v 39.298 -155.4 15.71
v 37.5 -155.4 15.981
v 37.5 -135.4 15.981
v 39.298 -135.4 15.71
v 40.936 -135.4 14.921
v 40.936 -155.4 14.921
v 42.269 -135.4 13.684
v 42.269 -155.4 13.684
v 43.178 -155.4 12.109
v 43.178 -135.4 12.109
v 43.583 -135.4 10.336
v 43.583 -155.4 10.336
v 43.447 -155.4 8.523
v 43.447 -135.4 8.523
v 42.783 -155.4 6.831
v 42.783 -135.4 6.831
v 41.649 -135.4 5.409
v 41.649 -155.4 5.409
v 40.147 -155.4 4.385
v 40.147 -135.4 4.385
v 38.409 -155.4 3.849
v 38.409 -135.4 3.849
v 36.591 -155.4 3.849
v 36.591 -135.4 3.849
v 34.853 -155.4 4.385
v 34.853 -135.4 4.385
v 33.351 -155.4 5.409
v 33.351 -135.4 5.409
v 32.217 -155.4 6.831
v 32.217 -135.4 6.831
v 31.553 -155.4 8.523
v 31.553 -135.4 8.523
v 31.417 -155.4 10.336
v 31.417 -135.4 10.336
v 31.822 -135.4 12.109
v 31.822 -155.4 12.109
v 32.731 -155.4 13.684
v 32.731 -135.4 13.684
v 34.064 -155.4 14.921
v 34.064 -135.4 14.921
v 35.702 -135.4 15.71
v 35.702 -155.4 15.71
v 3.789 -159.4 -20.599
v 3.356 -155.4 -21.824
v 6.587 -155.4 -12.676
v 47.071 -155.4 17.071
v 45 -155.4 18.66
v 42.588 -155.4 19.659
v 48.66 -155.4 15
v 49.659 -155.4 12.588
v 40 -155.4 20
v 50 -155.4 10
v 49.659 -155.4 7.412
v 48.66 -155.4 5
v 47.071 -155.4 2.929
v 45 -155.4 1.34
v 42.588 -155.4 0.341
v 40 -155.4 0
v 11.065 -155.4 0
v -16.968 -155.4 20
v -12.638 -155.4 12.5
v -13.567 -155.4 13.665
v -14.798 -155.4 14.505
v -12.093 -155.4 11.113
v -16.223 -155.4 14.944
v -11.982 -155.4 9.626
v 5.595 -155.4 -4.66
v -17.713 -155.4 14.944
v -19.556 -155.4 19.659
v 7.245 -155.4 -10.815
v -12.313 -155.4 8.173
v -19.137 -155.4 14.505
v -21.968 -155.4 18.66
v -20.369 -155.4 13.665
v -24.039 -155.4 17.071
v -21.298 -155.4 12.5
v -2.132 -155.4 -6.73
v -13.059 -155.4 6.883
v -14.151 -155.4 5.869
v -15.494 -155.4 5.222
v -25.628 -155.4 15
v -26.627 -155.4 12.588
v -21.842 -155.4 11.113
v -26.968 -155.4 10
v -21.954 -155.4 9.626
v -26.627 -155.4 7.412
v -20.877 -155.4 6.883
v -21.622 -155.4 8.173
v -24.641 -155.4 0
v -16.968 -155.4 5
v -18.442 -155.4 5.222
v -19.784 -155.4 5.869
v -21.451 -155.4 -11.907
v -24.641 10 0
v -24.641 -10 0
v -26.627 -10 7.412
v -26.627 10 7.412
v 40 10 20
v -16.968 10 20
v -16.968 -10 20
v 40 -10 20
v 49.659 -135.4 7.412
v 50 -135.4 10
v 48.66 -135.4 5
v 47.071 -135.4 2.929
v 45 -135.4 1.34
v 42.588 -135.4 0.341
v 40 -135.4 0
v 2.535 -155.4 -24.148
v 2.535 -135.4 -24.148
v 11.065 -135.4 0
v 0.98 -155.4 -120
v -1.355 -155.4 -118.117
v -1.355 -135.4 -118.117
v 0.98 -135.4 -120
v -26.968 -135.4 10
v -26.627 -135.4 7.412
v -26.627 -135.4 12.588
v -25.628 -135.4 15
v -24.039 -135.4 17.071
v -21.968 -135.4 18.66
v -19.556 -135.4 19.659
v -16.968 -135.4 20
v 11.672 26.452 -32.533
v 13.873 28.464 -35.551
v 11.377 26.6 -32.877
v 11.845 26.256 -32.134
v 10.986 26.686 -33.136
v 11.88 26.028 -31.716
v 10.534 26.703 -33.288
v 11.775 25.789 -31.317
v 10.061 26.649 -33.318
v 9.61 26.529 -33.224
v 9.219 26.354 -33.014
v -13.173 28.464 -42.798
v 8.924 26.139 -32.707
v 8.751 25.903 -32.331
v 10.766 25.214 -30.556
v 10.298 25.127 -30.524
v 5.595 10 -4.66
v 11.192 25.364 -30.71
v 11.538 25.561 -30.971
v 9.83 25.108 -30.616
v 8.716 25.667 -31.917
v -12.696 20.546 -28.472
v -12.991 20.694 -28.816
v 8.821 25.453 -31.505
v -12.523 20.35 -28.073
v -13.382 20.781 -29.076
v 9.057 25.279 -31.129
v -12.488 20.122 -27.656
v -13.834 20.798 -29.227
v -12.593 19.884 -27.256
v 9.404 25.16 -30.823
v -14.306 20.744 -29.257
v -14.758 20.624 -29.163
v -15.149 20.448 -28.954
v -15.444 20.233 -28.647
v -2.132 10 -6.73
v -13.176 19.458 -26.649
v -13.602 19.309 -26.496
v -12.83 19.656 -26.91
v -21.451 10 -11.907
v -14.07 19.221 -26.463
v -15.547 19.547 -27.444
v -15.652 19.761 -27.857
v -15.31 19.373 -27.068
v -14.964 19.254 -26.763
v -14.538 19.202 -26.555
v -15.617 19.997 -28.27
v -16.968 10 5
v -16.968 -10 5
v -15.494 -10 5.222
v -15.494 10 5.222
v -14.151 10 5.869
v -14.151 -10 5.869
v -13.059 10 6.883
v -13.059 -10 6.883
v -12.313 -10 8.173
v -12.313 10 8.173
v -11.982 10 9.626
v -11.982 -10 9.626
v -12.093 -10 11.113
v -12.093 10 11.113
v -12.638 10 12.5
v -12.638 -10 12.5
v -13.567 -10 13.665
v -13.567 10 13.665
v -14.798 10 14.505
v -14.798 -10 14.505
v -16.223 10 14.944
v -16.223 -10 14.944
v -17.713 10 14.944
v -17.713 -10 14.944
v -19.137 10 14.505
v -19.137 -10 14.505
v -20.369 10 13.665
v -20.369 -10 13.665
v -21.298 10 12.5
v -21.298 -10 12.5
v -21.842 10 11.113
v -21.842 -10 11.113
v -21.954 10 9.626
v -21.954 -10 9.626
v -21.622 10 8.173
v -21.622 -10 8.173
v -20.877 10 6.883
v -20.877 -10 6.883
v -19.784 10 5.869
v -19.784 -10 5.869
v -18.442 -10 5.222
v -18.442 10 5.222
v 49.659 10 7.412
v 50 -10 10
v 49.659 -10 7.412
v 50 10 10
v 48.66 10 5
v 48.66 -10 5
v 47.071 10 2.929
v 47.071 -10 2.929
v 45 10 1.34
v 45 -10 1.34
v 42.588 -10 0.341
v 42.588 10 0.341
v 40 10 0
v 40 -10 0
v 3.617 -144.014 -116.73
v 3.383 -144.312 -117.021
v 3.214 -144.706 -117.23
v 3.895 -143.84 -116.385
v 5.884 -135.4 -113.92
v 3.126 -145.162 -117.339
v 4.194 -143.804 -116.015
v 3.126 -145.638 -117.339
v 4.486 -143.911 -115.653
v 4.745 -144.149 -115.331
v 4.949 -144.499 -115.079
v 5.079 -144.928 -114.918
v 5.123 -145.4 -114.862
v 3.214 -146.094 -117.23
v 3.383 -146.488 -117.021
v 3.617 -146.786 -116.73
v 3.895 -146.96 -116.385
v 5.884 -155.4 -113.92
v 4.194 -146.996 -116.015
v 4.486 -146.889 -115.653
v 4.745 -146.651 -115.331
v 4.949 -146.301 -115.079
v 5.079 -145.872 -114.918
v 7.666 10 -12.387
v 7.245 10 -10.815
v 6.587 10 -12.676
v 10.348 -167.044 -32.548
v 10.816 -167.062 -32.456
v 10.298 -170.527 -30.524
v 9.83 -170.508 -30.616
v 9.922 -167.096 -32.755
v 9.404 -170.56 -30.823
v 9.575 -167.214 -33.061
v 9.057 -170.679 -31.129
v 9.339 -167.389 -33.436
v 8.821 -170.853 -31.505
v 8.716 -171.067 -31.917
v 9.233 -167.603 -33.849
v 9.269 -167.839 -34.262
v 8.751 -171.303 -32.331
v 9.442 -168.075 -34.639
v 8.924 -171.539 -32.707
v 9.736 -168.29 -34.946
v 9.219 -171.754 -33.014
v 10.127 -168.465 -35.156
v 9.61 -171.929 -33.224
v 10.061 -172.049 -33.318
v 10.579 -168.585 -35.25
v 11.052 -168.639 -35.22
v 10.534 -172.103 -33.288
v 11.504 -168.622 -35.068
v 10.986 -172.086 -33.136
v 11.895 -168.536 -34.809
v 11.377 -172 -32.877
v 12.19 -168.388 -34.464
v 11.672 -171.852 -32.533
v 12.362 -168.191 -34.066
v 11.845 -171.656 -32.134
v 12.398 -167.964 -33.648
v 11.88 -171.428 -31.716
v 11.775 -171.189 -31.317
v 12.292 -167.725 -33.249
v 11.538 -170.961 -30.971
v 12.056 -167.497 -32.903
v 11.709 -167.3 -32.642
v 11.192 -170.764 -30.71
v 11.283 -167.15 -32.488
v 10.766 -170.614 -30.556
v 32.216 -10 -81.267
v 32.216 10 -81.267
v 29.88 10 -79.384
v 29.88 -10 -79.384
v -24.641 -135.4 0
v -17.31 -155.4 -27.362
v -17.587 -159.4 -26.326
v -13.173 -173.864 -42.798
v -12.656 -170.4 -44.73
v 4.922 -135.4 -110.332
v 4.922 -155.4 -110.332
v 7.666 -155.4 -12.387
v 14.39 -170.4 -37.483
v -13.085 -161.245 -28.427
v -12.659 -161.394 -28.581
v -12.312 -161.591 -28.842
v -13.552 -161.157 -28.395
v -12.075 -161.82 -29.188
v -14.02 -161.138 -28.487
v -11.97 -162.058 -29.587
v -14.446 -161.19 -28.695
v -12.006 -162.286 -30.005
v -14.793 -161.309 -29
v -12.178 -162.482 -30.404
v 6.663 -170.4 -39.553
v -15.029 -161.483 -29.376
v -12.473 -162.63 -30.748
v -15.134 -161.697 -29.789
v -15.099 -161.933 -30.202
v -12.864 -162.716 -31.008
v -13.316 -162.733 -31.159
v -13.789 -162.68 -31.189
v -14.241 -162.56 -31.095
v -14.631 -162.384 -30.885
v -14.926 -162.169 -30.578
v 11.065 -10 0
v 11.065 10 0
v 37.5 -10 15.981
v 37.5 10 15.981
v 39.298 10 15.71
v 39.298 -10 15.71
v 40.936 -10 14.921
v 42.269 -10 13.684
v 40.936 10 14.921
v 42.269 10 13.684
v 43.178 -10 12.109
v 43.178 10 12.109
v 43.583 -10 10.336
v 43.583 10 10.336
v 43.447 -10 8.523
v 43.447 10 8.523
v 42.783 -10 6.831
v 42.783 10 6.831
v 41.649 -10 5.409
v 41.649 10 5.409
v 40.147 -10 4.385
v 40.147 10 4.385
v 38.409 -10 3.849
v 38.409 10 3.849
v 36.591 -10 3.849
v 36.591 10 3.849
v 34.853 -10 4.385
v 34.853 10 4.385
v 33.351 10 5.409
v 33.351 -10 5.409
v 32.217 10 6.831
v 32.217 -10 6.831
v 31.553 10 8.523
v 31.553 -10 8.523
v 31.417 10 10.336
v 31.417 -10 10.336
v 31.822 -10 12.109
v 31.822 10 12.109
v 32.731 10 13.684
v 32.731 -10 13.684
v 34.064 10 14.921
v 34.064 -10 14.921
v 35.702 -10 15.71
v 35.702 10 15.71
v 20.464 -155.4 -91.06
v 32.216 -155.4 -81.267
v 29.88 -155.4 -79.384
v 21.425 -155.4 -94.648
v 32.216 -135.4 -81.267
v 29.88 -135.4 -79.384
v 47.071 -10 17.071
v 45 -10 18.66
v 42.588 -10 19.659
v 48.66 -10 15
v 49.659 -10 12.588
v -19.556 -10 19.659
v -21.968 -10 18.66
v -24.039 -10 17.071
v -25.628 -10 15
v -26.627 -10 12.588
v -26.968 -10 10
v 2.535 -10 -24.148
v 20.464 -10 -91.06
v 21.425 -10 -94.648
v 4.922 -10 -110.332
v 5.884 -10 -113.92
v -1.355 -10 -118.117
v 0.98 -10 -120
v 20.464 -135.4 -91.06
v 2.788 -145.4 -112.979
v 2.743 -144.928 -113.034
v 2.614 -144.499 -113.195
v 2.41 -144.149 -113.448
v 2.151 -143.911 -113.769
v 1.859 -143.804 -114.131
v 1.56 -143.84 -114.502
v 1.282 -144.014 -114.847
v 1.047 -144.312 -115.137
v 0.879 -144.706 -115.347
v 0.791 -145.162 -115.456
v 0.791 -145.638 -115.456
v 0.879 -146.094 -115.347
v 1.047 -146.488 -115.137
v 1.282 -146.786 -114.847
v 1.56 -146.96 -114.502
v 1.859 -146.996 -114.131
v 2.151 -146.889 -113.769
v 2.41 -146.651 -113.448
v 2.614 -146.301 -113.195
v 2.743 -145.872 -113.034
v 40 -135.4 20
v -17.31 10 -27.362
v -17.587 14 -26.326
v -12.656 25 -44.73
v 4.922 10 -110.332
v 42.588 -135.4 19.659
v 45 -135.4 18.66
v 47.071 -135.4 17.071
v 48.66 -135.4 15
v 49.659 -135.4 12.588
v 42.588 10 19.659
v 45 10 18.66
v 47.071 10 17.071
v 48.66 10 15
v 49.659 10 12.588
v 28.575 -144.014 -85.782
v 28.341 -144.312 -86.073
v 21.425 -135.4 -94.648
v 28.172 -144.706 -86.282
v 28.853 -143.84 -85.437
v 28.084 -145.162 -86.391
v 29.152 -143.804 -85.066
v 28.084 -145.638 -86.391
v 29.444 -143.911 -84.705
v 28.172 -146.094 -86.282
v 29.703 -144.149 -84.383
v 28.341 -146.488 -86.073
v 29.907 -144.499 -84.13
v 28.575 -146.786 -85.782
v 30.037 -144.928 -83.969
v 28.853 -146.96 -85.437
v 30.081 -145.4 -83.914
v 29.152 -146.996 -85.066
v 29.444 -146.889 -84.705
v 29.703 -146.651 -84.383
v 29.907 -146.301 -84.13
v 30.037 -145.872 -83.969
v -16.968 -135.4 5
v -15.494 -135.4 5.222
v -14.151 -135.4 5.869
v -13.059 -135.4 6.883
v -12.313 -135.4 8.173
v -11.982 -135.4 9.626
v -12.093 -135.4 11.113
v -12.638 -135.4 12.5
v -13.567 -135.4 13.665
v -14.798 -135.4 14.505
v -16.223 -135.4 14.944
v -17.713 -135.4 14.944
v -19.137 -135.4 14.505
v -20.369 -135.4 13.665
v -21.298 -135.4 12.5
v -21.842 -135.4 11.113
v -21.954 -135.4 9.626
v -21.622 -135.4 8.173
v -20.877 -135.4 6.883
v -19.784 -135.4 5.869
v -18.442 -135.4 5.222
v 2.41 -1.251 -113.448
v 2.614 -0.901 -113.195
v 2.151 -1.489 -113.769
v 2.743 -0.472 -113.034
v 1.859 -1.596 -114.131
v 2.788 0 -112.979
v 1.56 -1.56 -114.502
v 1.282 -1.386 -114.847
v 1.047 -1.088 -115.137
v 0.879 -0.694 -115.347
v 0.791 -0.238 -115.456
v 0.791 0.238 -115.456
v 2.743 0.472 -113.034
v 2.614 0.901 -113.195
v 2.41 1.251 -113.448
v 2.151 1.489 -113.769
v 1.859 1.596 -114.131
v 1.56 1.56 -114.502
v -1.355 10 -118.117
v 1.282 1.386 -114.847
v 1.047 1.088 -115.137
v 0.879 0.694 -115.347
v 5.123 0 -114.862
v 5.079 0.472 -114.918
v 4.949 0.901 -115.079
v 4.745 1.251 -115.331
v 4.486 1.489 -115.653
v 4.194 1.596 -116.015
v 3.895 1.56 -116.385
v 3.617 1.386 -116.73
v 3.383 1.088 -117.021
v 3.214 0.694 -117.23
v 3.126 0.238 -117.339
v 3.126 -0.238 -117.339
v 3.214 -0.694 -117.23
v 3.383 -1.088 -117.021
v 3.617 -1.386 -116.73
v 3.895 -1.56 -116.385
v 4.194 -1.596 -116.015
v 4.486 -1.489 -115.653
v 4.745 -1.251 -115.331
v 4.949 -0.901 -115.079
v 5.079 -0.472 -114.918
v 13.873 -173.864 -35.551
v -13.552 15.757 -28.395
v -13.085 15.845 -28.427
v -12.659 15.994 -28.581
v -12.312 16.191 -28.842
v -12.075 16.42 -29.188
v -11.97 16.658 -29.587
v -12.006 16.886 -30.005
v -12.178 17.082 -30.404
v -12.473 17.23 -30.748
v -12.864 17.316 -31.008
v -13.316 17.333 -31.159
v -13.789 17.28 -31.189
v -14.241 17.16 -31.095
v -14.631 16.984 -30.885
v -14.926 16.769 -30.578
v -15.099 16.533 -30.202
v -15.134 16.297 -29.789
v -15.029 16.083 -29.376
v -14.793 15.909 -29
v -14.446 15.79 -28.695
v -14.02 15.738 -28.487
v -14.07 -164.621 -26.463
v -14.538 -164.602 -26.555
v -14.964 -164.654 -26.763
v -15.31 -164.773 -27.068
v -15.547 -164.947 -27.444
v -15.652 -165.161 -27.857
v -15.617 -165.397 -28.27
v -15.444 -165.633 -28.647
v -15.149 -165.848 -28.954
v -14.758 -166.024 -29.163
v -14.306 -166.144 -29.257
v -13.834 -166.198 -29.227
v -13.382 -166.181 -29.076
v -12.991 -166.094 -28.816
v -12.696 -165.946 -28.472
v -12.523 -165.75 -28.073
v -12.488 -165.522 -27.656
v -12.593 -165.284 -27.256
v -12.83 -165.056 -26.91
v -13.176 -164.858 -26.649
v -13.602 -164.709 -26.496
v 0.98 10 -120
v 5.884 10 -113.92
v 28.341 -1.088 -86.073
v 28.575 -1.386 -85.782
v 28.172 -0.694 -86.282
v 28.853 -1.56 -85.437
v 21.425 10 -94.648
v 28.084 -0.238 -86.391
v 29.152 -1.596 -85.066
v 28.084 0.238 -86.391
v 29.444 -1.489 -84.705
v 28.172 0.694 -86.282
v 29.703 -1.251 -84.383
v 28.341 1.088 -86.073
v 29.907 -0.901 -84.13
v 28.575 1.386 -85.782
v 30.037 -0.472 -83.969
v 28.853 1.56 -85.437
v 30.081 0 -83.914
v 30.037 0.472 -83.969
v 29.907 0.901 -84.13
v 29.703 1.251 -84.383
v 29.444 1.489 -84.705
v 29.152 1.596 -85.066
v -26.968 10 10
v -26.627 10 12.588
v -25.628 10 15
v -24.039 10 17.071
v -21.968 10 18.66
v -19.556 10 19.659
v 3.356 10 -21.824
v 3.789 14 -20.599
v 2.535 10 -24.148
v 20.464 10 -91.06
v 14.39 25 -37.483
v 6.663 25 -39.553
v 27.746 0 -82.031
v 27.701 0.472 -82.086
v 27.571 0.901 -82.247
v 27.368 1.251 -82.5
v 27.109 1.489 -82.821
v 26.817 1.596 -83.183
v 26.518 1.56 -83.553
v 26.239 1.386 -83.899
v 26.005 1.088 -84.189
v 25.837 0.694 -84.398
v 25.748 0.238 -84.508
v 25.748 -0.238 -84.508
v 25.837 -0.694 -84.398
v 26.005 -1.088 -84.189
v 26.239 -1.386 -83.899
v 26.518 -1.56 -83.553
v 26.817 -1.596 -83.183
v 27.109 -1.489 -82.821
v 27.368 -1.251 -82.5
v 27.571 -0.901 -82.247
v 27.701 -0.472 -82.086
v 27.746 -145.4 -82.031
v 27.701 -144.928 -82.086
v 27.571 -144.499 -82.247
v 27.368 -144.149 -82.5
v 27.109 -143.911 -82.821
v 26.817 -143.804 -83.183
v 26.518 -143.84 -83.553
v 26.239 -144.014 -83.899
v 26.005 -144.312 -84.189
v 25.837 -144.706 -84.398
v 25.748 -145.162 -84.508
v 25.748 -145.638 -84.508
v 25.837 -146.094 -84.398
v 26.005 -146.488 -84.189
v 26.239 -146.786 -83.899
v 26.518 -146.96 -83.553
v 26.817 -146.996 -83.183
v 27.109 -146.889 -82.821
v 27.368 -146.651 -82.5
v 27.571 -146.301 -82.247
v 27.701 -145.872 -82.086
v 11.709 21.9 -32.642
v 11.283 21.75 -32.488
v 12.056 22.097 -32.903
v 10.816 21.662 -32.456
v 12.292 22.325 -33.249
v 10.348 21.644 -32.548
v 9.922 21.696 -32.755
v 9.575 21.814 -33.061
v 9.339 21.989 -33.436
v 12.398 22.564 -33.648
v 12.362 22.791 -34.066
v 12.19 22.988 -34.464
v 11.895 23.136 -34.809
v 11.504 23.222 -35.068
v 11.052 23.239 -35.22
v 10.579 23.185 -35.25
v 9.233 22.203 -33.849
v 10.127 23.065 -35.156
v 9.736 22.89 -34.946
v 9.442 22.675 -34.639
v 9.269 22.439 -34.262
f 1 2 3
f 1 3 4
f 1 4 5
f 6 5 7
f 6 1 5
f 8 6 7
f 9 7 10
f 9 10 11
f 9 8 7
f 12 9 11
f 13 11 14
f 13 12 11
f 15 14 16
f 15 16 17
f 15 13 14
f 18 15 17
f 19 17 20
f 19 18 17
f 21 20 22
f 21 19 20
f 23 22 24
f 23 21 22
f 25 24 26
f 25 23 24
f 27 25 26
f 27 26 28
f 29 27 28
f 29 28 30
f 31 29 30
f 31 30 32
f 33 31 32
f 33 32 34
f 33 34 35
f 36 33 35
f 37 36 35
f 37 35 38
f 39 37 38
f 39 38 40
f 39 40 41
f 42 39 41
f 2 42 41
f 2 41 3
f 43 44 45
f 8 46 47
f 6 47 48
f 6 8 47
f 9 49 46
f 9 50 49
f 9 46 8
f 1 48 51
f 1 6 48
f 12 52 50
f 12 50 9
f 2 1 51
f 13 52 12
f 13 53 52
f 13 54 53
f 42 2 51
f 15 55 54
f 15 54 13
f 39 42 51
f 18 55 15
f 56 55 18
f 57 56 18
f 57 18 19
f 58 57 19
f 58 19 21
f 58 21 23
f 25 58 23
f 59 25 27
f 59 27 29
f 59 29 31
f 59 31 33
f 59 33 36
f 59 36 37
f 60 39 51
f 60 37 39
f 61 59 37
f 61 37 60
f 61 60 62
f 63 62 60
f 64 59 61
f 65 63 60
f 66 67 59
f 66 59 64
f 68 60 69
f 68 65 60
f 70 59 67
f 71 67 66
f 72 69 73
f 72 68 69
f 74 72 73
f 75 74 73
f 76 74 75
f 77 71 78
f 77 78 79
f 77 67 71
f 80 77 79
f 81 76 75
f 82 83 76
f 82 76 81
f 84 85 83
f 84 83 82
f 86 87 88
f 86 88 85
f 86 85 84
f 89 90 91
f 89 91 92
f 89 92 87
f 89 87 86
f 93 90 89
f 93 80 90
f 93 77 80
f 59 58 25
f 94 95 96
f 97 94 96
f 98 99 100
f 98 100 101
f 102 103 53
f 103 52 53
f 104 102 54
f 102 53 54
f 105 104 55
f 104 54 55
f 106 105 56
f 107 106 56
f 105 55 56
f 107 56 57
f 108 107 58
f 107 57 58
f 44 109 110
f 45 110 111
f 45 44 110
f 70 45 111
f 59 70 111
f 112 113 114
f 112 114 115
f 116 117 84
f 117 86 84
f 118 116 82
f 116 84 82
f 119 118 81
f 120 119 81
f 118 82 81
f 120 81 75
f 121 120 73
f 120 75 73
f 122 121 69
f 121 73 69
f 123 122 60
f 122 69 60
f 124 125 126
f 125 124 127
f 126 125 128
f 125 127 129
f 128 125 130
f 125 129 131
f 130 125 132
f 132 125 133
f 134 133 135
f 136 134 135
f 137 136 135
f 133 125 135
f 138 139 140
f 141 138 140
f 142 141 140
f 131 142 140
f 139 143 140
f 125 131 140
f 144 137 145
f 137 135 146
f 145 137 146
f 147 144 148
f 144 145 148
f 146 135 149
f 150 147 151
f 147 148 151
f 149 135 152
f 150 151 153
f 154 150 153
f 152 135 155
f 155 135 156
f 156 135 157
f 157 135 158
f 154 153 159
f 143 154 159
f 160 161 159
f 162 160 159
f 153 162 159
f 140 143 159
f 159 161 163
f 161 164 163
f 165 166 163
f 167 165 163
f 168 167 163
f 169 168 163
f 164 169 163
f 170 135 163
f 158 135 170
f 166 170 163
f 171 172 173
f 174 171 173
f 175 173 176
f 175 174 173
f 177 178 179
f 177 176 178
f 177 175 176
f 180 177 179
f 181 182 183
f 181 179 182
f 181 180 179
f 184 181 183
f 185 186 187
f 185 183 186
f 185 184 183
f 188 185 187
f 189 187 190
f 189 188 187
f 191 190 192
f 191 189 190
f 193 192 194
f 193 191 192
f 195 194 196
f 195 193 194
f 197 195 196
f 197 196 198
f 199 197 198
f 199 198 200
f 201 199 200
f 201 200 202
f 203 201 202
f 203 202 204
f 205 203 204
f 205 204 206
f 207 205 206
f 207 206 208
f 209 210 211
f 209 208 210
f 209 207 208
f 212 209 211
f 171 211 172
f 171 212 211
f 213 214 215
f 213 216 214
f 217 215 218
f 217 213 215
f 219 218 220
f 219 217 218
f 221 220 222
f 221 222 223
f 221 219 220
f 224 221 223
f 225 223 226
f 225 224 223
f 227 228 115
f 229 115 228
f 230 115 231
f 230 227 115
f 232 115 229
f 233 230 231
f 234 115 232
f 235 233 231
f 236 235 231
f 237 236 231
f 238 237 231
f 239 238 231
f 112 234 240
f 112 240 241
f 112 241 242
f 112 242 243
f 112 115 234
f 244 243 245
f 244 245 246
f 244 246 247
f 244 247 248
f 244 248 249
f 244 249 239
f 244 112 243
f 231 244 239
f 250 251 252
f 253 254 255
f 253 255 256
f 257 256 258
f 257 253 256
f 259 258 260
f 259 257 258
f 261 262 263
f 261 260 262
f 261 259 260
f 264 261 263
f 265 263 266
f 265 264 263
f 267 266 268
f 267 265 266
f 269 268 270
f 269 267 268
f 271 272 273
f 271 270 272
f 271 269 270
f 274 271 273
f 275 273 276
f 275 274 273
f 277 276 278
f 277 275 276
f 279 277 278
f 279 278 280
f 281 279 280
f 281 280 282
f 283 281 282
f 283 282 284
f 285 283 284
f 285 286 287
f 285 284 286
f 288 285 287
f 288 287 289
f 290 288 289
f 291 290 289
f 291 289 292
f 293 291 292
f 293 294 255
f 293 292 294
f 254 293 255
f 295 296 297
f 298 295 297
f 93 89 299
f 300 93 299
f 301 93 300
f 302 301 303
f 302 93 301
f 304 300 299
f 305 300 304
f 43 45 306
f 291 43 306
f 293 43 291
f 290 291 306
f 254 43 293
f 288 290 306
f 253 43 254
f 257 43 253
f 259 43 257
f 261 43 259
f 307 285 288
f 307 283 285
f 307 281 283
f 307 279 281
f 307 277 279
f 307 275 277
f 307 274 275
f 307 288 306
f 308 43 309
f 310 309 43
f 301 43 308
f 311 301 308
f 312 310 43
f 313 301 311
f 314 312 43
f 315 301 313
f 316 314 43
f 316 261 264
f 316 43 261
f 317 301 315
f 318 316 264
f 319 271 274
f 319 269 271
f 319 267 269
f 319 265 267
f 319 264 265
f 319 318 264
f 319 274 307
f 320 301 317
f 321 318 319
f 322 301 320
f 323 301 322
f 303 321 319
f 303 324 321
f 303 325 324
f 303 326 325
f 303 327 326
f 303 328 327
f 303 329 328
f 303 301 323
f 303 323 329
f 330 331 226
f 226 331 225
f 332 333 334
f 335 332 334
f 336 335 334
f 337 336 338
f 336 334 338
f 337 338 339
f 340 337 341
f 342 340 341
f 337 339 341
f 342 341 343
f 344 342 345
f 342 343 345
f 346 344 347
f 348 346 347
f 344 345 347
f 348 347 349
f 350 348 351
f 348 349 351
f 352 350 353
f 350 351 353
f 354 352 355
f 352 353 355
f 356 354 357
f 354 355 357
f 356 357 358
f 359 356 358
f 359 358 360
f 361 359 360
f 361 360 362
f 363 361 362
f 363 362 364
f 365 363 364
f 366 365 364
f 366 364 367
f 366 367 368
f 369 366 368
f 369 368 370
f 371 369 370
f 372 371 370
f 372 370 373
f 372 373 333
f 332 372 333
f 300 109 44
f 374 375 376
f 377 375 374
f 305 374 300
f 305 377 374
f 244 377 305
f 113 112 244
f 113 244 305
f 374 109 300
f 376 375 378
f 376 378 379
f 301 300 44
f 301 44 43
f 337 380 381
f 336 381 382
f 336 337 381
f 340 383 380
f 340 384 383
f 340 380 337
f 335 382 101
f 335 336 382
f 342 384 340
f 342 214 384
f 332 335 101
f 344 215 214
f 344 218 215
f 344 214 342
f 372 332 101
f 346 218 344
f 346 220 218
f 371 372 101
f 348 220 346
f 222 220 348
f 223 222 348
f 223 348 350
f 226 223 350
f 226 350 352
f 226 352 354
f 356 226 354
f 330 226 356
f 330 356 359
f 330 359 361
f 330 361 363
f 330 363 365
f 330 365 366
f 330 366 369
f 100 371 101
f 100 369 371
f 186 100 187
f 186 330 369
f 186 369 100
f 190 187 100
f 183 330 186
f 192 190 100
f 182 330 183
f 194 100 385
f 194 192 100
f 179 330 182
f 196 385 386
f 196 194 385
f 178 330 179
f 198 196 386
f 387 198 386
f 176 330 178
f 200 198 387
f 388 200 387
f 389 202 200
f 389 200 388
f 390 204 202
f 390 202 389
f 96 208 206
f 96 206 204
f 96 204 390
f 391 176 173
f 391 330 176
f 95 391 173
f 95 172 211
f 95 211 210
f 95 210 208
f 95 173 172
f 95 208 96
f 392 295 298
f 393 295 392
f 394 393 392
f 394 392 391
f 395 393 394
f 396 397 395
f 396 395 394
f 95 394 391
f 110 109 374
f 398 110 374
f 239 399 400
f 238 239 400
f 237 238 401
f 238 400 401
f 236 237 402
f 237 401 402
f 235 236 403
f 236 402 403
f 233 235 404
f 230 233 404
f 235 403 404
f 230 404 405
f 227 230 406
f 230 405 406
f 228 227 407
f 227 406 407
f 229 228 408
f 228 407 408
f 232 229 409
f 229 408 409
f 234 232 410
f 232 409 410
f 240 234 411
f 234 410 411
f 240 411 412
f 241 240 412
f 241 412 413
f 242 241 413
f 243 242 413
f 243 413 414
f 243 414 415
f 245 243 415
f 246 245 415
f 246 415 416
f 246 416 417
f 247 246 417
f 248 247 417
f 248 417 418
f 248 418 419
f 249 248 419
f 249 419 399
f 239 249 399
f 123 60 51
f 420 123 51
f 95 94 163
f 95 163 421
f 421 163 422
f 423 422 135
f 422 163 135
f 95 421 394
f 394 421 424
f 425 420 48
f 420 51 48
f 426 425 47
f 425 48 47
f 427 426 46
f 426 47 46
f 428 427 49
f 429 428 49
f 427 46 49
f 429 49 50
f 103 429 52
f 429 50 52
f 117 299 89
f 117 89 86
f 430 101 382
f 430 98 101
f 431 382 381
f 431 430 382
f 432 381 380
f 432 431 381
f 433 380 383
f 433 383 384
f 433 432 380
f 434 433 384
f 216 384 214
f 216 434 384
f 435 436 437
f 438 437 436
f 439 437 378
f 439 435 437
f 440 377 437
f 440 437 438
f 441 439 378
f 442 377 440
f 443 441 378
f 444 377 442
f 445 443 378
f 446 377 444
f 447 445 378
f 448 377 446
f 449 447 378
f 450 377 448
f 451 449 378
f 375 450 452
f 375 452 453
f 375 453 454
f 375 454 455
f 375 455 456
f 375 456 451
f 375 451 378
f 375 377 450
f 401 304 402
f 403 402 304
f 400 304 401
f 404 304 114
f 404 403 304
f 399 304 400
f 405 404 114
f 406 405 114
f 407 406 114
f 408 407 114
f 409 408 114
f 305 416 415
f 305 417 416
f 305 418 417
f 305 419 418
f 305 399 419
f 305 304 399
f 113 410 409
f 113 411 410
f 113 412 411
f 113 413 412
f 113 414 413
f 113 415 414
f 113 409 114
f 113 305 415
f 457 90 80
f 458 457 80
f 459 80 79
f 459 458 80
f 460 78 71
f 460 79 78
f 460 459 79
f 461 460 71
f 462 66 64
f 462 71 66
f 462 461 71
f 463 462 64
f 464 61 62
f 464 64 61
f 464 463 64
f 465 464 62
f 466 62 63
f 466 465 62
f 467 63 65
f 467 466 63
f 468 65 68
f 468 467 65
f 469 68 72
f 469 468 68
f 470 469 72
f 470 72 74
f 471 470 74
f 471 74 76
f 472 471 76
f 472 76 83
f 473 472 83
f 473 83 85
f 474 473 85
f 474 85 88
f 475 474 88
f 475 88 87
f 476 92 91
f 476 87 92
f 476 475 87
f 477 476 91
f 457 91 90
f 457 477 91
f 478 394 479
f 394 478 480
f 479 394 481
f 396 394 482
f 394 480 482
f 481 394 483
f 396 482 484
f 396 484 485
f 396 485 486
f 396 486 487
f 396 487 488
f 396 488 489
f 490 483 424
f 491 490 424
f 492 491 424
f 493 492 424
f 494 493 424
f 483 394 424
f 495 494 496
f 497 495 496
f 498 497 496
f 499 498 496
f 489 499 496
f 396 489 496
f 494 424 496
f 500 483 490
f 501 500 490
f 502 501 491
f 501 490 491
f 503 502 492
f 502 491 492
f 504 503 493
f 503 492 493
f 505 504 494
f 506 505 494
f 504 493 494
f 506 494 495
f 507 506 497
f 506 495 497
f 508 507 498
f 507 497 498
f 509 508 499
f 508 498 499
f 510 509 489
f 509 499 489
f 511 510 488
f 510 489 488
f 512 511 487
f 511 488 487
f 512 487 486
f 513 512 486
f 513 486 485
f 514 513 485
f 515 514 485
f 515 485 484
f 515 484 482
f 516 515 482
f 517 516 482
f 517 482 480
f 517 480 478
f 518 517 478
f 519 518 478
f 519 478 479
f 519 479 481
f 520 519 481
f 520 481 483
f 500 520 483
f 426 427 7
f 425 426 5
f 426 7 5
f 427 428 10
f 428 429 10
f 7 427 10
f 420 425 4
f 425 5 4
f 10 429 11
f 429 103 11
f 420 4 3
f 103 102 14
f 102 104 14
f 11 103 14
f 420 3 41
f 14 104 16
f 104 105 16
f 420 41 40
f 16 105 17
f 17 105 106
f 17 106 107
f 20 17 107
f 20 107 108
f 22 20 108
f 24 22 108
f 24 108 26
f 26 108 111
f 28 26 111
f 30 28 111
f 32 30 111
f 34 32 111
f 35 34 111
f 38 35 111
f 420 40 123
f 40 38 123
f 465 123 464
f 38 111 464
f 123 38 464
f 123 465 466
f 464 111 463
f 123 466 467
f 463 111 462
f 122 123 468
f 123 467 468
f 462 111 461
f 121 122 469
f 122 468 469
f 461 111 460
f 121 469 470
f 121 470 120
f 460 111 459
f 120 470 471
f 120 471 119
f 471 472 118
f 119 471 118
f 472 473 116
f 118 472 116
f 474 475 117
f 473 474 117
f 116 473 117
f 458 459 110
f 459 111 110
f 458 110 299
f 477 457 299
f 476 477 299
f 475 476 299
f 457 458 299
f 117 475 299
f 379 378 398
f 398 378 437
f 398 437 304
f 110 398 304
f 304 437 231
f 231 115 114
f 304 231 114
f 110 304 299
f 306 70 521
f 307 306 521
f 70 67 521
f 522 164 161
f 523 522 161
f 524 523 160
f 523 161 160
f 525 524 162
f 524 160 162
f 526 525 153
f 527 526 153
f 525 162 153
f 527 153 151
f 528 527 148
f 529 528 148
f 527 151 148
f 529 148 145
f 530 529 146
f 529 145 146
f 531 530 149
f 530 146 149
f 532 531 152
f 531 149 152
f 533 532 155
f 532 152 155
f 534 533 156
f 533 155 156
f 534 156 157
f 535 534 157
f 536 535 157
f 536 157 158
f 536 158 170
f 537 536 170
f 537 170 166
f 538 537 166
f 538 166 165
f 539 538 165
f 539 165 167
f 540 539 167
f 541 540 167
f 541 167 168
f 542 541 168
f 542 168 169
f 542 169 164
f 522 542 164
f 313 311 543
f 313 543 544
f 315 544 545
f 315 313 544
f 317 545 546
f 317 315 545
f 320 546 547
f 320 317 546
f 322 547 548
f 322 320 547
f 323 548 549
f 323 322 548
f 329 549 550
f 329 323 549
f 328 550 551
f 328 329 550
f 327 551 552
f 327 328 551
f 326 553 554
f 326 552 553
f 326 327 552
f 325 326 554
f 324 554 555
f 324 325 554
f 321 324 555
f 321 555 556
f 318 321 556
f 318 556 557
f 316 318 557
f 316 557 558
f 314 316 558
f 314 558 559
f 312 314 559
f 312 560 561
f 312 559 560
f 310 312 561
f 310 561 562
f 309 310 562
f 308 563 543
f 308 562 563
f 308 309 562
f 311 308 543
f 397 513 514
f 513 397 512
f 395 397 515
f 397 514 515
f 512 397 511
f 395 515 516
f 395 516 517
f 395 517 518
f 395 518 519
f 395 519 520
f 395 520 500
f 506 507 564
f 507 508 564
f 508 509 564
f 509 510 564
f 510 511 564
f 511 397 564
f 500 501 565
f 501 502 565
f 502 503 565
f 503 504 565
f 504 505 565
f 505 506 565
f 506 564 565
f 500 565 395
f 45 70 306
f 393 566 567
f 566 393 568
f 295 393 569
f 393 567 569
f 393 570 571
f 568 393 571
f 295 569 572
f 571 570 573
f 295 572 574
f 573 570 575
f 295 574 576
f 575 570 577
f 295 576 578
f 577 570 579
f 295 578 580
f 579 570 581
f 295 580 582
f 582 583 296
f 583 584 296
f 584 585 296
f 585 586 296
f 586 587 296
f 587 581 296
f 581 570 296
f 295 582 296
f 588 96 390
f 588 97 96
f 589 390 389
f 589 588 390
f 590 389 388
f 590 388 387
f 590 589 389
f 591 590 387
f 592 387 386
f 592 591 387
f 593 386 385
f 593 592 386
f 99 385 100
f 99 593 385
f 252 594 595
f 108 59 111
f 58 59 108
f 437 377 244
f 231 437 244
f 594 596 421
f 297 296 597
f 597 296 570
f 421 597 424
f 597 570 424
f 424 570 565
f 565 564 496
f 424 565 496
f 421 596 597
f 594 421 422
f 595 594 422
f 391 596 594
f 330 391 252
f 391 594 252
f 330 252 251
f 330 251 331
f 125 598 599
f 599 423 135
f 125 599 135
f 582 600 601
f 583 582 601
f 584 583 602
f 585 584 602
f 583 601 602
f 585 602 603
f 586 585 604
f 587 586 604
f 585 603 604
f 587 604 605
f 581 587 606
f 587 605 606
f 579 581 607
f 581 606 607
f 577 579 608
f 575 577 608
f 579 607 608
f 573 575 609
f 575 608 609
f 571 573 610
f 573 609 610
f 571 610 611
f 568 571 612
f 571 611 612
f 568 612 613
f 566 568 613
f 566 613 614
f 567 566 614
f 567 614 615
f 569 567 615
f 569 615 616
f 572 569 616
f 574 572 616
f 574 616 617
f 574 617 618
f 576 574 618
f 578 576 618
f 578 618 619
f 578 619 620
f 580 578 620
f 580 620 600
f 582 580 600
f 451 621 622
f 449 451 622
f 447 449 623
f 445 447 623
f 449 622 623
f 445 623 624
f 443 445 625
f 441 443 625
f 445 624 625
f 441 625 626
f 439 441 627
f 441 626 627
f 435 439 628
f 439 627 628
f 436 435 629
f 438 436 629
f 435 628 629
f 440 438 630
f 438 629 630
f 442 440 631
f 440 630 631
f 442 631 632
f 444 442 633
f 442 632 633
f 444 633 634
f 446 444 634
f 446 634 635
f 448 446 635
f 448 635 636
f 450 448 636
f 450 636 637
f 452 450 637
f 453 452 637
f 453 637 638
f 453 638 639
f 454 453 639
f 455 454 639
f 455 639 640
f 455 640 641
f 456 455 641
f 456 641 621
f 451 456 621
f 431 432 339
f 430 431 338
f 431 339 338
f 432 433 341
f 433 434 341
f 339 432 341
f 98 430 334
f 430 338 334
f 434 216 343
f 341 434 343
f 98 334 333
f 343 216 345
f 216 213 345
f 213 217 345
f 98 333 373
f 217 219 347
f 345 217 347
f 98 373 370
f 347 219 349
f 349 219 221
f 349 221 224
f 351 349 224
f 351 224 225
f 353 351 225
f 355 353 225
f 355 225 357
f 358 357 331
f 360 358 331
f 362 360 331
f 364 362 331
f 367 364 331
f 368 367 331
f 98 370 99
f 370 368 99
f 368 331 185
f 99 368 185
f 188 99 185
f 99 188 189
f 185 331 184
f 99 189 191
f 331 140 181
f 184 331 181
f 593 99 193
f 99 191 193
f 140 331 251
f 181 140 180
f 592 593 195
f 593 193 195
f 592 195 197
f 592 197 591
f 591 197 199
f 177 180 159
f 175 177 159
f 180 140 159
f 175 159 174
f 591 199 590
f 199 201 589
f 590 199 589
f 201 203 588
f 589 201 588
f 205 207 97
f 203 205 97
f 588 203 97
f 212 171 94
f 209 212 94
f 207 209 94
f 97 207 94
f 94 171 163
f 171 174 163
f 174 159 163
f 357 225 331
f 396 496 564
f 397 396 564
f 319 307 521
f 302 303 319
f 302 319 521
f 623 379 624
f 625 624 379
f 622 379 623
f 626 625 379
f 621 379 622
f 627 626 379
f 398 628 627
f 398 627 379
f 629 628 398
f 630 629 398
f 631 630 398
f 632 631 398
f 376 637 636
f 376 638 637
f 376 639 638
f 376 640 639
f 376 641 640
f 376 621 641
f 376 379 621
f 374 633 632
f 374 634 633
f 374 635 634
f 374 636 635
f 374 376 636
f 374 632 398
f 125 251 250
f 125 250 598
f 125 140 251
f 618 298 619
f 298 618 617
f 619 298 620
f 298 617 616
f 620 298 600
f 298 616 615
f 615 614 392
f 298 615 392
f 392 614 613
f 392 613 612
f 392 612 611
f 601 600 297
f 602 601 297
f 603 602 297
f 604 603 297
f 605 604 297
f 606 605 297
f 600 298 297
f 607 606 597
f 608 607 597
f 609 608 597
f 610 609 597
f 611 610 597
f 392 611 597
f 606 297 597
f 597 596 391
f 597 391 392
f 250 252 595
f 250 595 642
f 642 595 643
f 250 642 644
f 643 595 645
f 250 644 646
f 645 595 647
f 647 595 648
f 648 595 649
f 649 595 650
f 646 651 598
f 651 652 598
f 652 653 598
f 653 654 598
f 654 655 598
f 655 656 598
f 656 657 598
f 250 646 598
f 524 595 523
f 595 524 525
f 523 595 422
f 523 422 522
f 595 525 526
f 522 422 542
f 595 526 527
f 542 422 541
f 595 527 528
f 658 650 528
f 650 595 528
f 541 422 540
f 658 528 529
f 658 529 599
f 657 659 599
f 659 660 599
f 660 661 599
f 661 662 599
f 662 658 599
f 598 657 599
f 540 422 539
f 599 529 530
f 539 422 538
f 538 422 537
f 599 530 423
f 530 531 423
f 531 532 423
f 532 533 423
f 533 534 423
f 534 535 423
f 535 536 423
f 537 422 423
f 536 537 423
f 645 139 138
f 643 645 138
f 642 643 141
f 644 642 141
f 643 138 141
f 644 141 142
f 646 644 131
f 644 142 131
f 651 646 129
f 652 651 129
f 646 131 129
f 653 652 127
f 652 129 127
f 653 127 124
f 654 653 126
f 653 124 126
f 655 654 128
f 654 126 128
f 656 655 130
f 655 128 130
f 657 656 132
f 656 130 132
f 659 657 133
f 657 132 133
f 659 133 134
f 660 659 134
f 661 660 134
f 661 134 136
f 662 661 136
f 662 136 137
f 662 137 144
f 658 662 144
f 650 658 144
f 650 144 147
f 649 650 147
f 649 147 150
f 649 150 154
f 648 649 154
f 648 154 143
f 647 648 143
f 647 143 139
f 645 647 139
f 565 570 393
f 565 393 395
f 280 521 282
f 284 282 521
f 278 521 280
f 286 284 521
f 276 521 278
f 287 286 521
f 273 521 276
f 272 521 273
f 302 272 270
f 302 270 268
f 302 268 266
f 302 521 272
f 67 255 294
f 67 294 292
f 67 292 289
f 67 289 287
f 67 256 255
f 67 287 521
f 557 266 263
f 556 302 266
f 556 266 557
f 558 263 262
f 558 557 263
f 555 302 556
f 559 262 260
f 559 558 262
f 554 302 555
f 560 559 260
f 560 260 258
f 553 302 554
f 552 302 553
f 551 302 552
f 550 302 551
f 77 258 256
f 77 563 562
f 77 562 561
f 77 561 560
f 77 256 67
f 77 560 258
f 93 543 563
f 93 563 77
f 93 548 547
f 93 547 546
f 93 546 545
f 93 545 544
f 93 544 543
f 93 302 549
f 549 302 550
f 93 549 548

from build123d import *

# Parameters (mm, degrees)
SKETCH_1_W               = 100
SKETCH_1_H               = 20
EXTRUDE_1_DEPTH          = 20
SKETCH_2_R               = 6.1
CUT_EXTRUDE_1_DEPTH      = 58.445626465
FILLET_1_R               = 10
FILLET_2_R               = 10
SKETCH_4_W               = 20
SKETCH_4_H               = 20
CUT_EXTRUDE_2_DEPTH      = 20
EXTRUDE_2_DEPTH          = 20
CUT_EXTRUDE_3_DEPTH      = 130.258709652
CUT_EXTRUDE_4_DEPTH      = 130.258709652
EXTRUDE_3_DEPTH          = 20
EXTRUDE_4_DEPTH          = 20
FILLET_3_R               = 10
EXTRUDE_5_DEPTH          = 20
EXTRUDE_6_DEPTH          = 8
EXTRUDE_7_REACH          = 140.193
CUT_EXTRUDE_5_DEPTH      = 210.16834973
CUT_EXTRUDE_5_DEPTH_BACK = 210.16834973
SKETCH_15_R              = 5
CUT_EXTRUDE_6_DEPTH      = 242.818562796
CUT_EXTRUDE_6_DEPTH_BACK = 10
SKETCH_16_R              = 1.6
SKETCH_18_R              = 1.6
CUT_EXTRUDE_7_DEPTH      = 10
SKETCH_19_R              = 1.6
CUT_EXTRUDE_8_DEPTH      = 10
SKETCH_20_R              = 1.6
CUT_EXTRUDE_9_DEPTH      = 10


with BuildPart() as part:
    # 草图1 → 凸台-拉伸1 (new body)
    with BuildSketch(Plane.XY):
        Rectangle(SKETCH_1_W, SKETCH_1_H)
    extrude(amount=EXTRUDE_1_DEPTH)

    # 草图2 → 切除-拉伸1 (cut, through all)
    with BuildSketch(Plane(origin=(0, 10, 0), x_dir=(1, 0, 0), z_dir=(0, 1, 0))):
        with Locations(Location((37.5, -9.880544607, 0), (0, 0, 270))):
            Circle(SKETCH_2_R)
    extrude(amount=-CUT_EXTRUDE_1_DEPTH, mode=Mode.SUBTRACT)

    # 圆角1
    fillet_1_edges = [part.edges().sort_by_distance(p)[0] for p in [
        (50, 0, 20),
    ]]
    fillet(fillet_1_edges, radius=FILLET_1_R)

    # 圆角2
    fillet_2_edges = [part.edges().sort_by_distance(p)[0] for p in [
        (50, 0, 0),
    ]]
    fillet(fillet_2_edges, radius=FILLET_2_R - 0.0001)  # a hair under: the kernel refuses the full size

    # 草图4 → 切除-拉伸2 (cut)
    with BuildSketch(Plane.ZY.offset(50)):
        with Locations((10, 0)):
            Rectangle(SKETCH_4_W, SKETCH_4_H)
    extrude(amount=-CUT_EXTRUDE_2_DEPTH, mode=Mode.SUBTRACT)

    # 草图6 → 凸台-拉伸2 (add)
    with BuildSketch(Plane(origin=(0, 10, 0), x_dir=(1, 0, 0), z_dir=(0, 1, 0))):
        Polygon((-3.935492543, 0), (22.386428262, 98.234745796), (6.84479722, 117.50665522), (-30, -20), align=None)
    extrude(amount=-EXTRUDE_2_DEPTH)

    # 草图7 → 切除-拉伸3 (cut, through all)
    with BuildSketch(Plane(origin=(0, 10, 0), x_dir=(1, 0, 0), z_dir=(0, 1, 0))):
        Polygon((-24.641016151, 0), (-30, -20), (-30, 0), align=None)
    extrude(amount=-CUT_EXTRUDE_3_DEPTH, mode=Mode.SUBTRACT)

    # 草图9 → 切除-拉伸4 (cut, through all)
    with BuildSketch(Plane(origin=(0, 10, 0), x_dir=(1, 0, 0), z_dir=(0, 1, 0))):
        Polygon((6.84479722, 117.50665522), (22.386428262, 98.234745796), (21.425259639, 94.64761566), (5.883628597, 113.919525084), align=None)
    extrude(amount=-CUT_EXTRUDE_4_DEPTH, mode=Mode.SUBTRACT)

    # 草图10 → 凸台-拉伸3 (add, through all)
    with BuildSketch(Plane(origin=(0, 10, 0), x_dir=(1, 0, 0), z_dir=(0, 1, 0))):
        Polygon((11.064507457, 0), (-3.935492543, 0), (2.534983584, 24.148145657), align=None)
    extrude(amount=-EXTRUDE_3_DEPTH)

    # 草图11 → 凸台-拉伸4 (add, through all)
    with BuildSketch(Plane(origin=(0, 10, 0), x_dir=(1, 0, 0), z_dir=(0, 1, 0))):
        Polygon((0.980244914, 119.999811377), (32.215545654, 81.267461789), (29.880292834, 79.384221425), (-1.355007905, 118.116571014), align=None)
    extrude(amount=-EXTRUDE_4_DEPTH)

    # 圆角3
    fillet_3_edges = [part.edges().sort_by_distance(p)[0] for p in [
        (-30, 0, 20),
    ]]
    fillet(fillet_3_edges, radius=FILLET_3_R)

    # 草图12 → 凸台-拉伸5 (add)
    with BuildSketch(Plane(origin=(-22.990381057, 0, -6.160254038), x_dir=(-0.2588190451025246, 0, 0.9659258262890673), z_dir=(-0.9659258262890673, 0, -0.2588190451025246))):
        Polygon((-5.94916585, 10), (-13.94916585, 10), (-39.929927963, 25), (-37.929927963, 28.464101615), align=None)
    extrude(amount=-EXTRUDE_5_DEPTH)

    # 草图13 → 凸台-拉伸6 (add)
    with BuildSketch(Plane(origin=(-3.671864531, 0, -0.983873136), x_dir=(0.2588190451025246, 0, -0.9659258262890672), z_dir=(0.9659258262890673, 0, 0.2588190451025247))):
        Polygon((37.929927963, 28.464101615), (5.94916585, 10), (13.94916585, 10), (39.929927963, 25), align=None)
    extrude(amount=EXTRUDE_6_DEPTH)

    # 凸台-拉伸7: up to this plane
    extrude_7_end = Plane(origin=(2.534983584, -10, -24.148145657), z_dir=(0.9429088246168765, 0, -0.33305096976231796))
    # 草图14 → 凸台-拉伸7 (add, up to the surface)
    with BuildSketch(Plane(origin=(-22.990381057, 0, -6.160254038), x_dir=(-0.2588190451025246, 0, 0.9659258262890673), z_dir=(-0.9659258262890673, 0, -0.2588190451025246)), mode=Mode.PRIVATE) as extrude_7_sk1:
        Polygon((-20.87736908, 14), (-13.94916585, 10), (-21.94916585, 10), align=None)
    extrude_7_tool1 = split(extrude(extrude_7_sk1.sketch, amount=-EXTRUDE_7_REACH, mode=Mode.PRIVATE), bisect_by=extrude_7_end, keep=Keep.BOTH, mode=Mode.PRIVATE)
    add(extrude_7_tool1.solids().sort_by_distance((-18.09217, 11.333333, -24.440626))[0])


with BuildPart() as body_2:
    # 镜向1: mirrored copy
    add(part.part.mirror(Plane(origin=(0, -72.7, 0), x_dir=(0, 0, 1), z_dir=(0, -1, 0))))


with BuildPart() as cut_extrude_5_tool:
    # 草图15 → 切除-拉伸5 (new, two sides: drawn at the far end of the back side and taken through both)
    with BuildSketch(Plane.XZ.offset(10).offset(-CUT_EXTRUDE_5_DEPTH_BACK)):
        with Locations(Location((-16.967746272, 10, 0), (0, 0, 270))):
            Circle(SKETCH_15_R)
    extrude(amount=CUT_EXTRUDE_5_DEPTH + CUT_EXTRUDE_5_DEPTH_BACK)


with BuildPart() as part_1:
    add(part.part)

    # 切除-拉伸5: cut by cut_extrude_5_tool
    add(cut_extrude_5_tool.part, mode=Mode.SUBTRACT)

    # 草图18 → 切除-拉伸7 (cut)
    with BuildSketch(Plane(origin=(-0.735779984, 4.923935621, 2.745968284), x_dir=(0.9915912340642462, 0.11302231218972869, 0.06303000455523398), z_dir=(-0.12940952255126095, 0.8660254037844418, 0.4829629131445286))):
        with Locations(Location((-13.447263702, 34.073742899, 0), (0, 0, 270))):
            Circle(SKETCH_18_R)
        with Locations(Location((11.127233063, 40.496679047, 0), (0, 0, 270))):
            Circle(SKETCH_18_R)
    extrude(amount=-CUT_EXTRUDE_7_DEPTH, mode=Mode.SUBTRACT)

    # 草图19 → 切除-拉伸8 (cut)
    with BuildSketch(Plane(origin=(56.896516967, 0, -45.883604723), x_dir=(0.6277467879246018, 0, 0.7784176065906688), z_dir=(-0.7784176065906688, 0, 0.6277467879246018))):
        with Locations((-87.794620367, 0)):
            Circle(SKETCH_19_R)
        with Locations((-48.036817794, 0)):
            Circle(SKETCH_19_R)
    extrude(amount=-CUT_EXTRUDE_8_DEPTH, mode=Mode.SUBTRACT)


with BuildPart() as body_2_1:
    add(body_2.part)

    # 切除-拉伸5: cut by cut_extrude_5_tool
    add(cut_extrude_5_tool.part, mode=Mode.SUBTRACT)

    # 草图16 → 切除-拉伸6 (cut, two sides: drawn at the far end of the back side and taken through both)
    with BuildSketch(Plane(origin=(-17.031039191, -113.973935621, 63.560703566), x_dir=(0.9915912340642462, -0.11302231218972869, 0.06303000455523398), z_dir=(-0.12940952255126095, -0.8660254037844418, 0.4829629131445286)).offset(-CUT_EXTRUDE_6_DEPTH_BACK)):
        with Locations(Location((2.986180491, -104.892044997, 0), (0, 0, 90))):
            Circle(SKETCH_16_R)
        with Locations(Location((27.560677255, -111.314981145, 0), (0, 0, 90))):
            Circle(SKETCH_16_R)
    extrude(amount=CUT_EXTRUDE_6_DEPTH + CUT_EXTRUDE_6_DEPTH_BACK, mode=Mode.SUBTRACT)

    # 草图20 → 切除-拉伸9 (cut)
    with BuildSketch(Plane(origin=(56.896516967, 0, -45.883604723), x_dir=(0.6277467879246018, 0, 0.7784176065906688), z_dir=(-0.7784176065906688, 0, 0.6277467879246018))):
        with Locations((-87.794620367, -145.4)):
            Circle(SKETCH_20_R)
        with Locations((-48.036817794, -145.4)):
            Circle(SKETCH_20_R)
    extrude(amount=-CUT_EXTRUDE_9_DEPTH, mode=Mode.SUBTRACT)


solid = Compound([part_1.part, body_2_1.part])
